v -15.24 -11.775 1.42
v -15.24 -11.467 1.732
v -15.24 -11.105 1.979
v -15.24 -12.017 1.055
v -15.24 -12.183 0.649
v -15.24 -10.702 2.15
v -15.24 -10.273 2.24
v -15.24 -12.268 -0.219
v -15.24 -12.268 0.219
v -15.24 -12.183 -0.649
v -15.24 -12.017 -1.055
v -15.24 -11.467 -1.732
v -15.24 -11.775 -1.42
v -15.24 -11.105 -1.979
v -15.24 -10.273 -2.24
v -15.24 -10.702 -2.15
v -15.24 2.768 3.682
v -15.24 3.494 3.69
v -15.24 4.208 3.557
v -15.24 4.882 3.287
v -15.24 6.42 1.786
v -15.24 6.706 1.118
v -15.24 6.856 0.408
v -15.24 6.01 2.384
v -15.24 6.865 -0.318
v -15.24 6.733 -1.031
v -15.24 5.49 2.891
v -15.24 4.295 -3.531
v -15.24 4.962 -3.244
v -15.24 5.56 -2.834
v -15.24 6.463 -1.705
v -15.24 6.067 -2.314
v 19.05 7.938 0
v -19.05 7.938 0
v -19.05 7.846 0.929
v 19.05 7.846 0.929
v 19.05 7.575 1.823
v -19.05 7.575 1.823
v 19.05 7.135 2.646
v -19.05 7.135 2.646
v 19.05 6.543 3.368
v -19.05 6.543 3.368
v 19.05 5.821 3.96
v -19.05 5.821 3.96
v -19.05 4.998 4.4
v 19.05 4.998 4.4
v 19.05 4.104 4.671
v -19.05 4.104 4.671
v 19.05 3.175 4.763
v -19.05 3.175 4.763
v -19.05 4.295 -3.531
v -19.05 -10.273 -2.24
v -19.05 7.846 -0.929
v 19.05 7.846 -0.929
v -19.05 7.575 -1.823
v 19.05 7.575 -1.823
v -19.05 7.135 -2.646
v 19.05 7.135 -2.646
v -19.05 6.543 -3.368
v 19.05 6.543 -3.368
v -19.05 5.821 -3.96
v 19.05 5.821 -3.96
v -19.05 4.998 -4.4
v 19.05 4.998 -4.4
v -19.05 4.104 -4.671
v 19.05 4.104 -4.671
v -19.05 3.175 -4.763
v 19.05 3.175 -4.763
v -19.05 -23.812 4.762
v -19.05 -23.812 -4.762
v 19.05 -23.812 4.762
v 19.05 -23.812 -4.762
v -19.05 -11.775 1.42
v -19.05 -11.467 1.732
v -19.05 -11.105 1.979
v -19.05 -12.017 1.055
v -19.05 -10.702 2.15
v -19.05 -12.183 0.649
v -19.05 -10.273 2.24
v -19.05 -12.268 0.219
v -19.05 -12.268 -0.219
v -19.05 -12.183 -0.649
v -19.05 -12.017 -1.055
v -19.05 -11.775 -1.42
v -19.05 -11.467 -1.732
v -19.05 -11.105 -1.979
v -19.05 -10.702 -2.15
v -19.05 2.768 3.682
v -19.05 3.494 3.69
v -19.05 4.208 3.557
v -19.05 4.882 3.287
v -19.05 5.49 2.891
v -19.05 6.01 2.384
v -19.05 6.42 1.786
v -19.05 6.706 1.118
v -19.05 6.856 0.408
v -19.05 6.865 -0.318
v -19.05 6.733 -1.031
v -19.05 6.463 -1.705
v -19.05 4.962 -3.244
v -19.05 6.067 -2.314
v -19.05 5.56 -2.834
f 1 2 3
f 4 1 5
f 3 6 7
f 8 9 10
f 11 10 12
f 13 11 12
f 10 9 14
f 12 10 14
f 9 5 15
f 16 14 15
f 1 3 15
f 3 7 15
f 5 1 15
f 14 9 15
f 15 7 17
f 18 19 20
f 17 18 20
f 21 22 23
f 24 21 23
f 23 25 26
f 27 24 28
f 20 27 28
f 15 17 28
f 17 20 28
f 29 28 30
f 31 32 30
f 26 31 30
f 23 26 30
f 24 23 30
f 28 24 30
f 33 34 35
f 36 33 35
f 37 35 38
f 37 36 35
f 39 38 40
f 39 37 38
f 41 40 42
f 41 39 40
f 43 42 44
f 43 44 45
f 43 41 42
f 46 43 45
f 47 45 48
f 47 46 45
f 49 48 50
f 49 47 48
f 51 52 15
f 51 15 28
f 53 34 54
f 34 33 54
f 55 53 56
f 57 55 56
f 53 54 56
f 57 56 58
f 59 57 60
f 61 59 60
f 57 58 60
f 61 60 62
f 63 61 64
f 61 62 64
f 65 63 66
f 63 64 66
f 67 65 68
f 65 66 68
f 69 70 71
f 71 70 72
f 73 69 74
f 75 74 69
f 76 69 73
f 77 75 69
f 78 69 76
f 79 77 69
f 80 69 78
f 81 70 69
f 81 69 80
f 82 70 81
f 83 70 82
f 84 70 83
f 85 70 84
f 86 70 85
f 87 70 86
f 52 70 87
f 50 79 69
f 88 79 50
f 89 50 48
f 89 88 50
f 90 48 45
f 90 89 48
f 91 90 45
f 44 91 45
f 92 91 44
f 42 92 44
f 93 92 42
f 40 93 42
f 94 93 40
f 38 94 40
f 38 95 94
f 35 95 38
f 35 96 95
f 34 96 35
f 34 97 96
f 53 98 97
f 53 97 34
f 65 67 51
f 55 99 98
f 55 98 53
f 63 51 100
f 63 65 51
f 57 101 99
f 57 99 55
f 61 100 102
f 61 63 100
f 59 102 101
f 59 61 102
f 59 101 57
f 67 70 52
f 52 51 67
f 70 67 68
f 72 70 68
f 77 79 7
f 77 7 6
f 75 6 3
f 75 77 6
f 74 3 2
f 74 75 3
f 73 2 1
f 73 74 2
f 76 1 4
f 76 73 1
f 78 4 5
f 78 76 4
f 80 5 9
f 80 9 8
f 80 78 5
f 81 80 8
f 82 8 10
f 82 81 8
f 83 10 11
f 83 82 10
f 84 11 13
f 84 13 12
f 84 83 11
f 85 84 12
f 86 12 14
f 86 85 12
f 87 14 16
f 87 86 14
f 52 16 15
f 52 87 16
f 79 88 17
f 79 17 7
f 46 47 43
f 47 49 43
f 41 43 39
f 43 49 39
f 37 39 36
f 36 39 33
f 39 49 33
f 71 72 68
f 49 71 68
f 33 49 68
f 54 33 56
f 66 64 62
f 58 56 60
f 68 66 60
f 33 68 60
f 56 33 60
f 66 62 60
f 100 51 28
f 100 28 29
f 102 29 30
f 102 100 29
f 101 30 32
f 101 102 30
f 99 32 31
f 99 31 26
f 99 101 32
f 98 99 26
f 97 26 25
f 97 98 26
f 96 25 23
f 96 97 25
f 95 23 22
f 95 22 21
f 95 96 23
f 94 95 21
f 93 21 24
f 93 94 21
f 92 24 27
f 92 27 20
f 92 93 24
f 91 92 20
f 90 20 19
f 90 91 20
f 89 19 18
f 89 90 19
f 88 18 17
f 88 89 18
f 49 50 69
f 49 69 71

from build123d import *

# Parameters (mm, degrees)
MAIN_DEPTH            = 4.7625
MAIN_DEPTH_BACK       = 4.7625
SKETCH1_W             = 38.1
SKETCH1_H             = 31.75
FILLET_2_R            = 4.7625
SERVOHORNPOCKET_DEPTH = 3.81


with BuildPart() as part:
    # Sketch1 → Main (new, two sides: drawn at the far end of the back side and taken through both)
    with BuildSketch(Plane.XY.offset(-MAIN_DEPTH_BACK)):
        with Locations((0, -7.9375)):
            Rectangle(SKETCH1_W, SKETCH1_H)
    extrude(amount=MAIN_DEPTH + MAIN_DEPTH_BACK)

    # Fillet 2
    fillet_2_edges = [part.edges().sort_by_distance(p)[0] for p in [
        (0, 7.9375, -4.7625),
        (0, 7.9375, 4.7625),
    ]]
    fillet(fillet_2_edges, radius=FILLET_2_R - 0.0001)  # a hair under: the kernel refuses the full size

    # Sketch2 → ServoHornPocket (cut)
    with BuildSketch(Plane.ZY.offset(19.05)):
        with BuildLine():
            Line((3.681584666, 2.768121212), (2.240359567, -10.272598485))
            ThreePointArc((2.240359567, -10.272598485), (0, -12.279), (-2.240359567, -10.272598485))
            Line((-2.240359567, -10.272598485), (-3.530690742, 4.294749474))
            ThreePointArc((-3.530690742, 4.294749474), (0.767033706, 6.798710156), (3.681584666, 2.768121212))
        make_face()
    extrude(amount=-SERVOHORNPOCKET_DEPTH, mode=Mode.SUBTRACT)


solid = part.part
